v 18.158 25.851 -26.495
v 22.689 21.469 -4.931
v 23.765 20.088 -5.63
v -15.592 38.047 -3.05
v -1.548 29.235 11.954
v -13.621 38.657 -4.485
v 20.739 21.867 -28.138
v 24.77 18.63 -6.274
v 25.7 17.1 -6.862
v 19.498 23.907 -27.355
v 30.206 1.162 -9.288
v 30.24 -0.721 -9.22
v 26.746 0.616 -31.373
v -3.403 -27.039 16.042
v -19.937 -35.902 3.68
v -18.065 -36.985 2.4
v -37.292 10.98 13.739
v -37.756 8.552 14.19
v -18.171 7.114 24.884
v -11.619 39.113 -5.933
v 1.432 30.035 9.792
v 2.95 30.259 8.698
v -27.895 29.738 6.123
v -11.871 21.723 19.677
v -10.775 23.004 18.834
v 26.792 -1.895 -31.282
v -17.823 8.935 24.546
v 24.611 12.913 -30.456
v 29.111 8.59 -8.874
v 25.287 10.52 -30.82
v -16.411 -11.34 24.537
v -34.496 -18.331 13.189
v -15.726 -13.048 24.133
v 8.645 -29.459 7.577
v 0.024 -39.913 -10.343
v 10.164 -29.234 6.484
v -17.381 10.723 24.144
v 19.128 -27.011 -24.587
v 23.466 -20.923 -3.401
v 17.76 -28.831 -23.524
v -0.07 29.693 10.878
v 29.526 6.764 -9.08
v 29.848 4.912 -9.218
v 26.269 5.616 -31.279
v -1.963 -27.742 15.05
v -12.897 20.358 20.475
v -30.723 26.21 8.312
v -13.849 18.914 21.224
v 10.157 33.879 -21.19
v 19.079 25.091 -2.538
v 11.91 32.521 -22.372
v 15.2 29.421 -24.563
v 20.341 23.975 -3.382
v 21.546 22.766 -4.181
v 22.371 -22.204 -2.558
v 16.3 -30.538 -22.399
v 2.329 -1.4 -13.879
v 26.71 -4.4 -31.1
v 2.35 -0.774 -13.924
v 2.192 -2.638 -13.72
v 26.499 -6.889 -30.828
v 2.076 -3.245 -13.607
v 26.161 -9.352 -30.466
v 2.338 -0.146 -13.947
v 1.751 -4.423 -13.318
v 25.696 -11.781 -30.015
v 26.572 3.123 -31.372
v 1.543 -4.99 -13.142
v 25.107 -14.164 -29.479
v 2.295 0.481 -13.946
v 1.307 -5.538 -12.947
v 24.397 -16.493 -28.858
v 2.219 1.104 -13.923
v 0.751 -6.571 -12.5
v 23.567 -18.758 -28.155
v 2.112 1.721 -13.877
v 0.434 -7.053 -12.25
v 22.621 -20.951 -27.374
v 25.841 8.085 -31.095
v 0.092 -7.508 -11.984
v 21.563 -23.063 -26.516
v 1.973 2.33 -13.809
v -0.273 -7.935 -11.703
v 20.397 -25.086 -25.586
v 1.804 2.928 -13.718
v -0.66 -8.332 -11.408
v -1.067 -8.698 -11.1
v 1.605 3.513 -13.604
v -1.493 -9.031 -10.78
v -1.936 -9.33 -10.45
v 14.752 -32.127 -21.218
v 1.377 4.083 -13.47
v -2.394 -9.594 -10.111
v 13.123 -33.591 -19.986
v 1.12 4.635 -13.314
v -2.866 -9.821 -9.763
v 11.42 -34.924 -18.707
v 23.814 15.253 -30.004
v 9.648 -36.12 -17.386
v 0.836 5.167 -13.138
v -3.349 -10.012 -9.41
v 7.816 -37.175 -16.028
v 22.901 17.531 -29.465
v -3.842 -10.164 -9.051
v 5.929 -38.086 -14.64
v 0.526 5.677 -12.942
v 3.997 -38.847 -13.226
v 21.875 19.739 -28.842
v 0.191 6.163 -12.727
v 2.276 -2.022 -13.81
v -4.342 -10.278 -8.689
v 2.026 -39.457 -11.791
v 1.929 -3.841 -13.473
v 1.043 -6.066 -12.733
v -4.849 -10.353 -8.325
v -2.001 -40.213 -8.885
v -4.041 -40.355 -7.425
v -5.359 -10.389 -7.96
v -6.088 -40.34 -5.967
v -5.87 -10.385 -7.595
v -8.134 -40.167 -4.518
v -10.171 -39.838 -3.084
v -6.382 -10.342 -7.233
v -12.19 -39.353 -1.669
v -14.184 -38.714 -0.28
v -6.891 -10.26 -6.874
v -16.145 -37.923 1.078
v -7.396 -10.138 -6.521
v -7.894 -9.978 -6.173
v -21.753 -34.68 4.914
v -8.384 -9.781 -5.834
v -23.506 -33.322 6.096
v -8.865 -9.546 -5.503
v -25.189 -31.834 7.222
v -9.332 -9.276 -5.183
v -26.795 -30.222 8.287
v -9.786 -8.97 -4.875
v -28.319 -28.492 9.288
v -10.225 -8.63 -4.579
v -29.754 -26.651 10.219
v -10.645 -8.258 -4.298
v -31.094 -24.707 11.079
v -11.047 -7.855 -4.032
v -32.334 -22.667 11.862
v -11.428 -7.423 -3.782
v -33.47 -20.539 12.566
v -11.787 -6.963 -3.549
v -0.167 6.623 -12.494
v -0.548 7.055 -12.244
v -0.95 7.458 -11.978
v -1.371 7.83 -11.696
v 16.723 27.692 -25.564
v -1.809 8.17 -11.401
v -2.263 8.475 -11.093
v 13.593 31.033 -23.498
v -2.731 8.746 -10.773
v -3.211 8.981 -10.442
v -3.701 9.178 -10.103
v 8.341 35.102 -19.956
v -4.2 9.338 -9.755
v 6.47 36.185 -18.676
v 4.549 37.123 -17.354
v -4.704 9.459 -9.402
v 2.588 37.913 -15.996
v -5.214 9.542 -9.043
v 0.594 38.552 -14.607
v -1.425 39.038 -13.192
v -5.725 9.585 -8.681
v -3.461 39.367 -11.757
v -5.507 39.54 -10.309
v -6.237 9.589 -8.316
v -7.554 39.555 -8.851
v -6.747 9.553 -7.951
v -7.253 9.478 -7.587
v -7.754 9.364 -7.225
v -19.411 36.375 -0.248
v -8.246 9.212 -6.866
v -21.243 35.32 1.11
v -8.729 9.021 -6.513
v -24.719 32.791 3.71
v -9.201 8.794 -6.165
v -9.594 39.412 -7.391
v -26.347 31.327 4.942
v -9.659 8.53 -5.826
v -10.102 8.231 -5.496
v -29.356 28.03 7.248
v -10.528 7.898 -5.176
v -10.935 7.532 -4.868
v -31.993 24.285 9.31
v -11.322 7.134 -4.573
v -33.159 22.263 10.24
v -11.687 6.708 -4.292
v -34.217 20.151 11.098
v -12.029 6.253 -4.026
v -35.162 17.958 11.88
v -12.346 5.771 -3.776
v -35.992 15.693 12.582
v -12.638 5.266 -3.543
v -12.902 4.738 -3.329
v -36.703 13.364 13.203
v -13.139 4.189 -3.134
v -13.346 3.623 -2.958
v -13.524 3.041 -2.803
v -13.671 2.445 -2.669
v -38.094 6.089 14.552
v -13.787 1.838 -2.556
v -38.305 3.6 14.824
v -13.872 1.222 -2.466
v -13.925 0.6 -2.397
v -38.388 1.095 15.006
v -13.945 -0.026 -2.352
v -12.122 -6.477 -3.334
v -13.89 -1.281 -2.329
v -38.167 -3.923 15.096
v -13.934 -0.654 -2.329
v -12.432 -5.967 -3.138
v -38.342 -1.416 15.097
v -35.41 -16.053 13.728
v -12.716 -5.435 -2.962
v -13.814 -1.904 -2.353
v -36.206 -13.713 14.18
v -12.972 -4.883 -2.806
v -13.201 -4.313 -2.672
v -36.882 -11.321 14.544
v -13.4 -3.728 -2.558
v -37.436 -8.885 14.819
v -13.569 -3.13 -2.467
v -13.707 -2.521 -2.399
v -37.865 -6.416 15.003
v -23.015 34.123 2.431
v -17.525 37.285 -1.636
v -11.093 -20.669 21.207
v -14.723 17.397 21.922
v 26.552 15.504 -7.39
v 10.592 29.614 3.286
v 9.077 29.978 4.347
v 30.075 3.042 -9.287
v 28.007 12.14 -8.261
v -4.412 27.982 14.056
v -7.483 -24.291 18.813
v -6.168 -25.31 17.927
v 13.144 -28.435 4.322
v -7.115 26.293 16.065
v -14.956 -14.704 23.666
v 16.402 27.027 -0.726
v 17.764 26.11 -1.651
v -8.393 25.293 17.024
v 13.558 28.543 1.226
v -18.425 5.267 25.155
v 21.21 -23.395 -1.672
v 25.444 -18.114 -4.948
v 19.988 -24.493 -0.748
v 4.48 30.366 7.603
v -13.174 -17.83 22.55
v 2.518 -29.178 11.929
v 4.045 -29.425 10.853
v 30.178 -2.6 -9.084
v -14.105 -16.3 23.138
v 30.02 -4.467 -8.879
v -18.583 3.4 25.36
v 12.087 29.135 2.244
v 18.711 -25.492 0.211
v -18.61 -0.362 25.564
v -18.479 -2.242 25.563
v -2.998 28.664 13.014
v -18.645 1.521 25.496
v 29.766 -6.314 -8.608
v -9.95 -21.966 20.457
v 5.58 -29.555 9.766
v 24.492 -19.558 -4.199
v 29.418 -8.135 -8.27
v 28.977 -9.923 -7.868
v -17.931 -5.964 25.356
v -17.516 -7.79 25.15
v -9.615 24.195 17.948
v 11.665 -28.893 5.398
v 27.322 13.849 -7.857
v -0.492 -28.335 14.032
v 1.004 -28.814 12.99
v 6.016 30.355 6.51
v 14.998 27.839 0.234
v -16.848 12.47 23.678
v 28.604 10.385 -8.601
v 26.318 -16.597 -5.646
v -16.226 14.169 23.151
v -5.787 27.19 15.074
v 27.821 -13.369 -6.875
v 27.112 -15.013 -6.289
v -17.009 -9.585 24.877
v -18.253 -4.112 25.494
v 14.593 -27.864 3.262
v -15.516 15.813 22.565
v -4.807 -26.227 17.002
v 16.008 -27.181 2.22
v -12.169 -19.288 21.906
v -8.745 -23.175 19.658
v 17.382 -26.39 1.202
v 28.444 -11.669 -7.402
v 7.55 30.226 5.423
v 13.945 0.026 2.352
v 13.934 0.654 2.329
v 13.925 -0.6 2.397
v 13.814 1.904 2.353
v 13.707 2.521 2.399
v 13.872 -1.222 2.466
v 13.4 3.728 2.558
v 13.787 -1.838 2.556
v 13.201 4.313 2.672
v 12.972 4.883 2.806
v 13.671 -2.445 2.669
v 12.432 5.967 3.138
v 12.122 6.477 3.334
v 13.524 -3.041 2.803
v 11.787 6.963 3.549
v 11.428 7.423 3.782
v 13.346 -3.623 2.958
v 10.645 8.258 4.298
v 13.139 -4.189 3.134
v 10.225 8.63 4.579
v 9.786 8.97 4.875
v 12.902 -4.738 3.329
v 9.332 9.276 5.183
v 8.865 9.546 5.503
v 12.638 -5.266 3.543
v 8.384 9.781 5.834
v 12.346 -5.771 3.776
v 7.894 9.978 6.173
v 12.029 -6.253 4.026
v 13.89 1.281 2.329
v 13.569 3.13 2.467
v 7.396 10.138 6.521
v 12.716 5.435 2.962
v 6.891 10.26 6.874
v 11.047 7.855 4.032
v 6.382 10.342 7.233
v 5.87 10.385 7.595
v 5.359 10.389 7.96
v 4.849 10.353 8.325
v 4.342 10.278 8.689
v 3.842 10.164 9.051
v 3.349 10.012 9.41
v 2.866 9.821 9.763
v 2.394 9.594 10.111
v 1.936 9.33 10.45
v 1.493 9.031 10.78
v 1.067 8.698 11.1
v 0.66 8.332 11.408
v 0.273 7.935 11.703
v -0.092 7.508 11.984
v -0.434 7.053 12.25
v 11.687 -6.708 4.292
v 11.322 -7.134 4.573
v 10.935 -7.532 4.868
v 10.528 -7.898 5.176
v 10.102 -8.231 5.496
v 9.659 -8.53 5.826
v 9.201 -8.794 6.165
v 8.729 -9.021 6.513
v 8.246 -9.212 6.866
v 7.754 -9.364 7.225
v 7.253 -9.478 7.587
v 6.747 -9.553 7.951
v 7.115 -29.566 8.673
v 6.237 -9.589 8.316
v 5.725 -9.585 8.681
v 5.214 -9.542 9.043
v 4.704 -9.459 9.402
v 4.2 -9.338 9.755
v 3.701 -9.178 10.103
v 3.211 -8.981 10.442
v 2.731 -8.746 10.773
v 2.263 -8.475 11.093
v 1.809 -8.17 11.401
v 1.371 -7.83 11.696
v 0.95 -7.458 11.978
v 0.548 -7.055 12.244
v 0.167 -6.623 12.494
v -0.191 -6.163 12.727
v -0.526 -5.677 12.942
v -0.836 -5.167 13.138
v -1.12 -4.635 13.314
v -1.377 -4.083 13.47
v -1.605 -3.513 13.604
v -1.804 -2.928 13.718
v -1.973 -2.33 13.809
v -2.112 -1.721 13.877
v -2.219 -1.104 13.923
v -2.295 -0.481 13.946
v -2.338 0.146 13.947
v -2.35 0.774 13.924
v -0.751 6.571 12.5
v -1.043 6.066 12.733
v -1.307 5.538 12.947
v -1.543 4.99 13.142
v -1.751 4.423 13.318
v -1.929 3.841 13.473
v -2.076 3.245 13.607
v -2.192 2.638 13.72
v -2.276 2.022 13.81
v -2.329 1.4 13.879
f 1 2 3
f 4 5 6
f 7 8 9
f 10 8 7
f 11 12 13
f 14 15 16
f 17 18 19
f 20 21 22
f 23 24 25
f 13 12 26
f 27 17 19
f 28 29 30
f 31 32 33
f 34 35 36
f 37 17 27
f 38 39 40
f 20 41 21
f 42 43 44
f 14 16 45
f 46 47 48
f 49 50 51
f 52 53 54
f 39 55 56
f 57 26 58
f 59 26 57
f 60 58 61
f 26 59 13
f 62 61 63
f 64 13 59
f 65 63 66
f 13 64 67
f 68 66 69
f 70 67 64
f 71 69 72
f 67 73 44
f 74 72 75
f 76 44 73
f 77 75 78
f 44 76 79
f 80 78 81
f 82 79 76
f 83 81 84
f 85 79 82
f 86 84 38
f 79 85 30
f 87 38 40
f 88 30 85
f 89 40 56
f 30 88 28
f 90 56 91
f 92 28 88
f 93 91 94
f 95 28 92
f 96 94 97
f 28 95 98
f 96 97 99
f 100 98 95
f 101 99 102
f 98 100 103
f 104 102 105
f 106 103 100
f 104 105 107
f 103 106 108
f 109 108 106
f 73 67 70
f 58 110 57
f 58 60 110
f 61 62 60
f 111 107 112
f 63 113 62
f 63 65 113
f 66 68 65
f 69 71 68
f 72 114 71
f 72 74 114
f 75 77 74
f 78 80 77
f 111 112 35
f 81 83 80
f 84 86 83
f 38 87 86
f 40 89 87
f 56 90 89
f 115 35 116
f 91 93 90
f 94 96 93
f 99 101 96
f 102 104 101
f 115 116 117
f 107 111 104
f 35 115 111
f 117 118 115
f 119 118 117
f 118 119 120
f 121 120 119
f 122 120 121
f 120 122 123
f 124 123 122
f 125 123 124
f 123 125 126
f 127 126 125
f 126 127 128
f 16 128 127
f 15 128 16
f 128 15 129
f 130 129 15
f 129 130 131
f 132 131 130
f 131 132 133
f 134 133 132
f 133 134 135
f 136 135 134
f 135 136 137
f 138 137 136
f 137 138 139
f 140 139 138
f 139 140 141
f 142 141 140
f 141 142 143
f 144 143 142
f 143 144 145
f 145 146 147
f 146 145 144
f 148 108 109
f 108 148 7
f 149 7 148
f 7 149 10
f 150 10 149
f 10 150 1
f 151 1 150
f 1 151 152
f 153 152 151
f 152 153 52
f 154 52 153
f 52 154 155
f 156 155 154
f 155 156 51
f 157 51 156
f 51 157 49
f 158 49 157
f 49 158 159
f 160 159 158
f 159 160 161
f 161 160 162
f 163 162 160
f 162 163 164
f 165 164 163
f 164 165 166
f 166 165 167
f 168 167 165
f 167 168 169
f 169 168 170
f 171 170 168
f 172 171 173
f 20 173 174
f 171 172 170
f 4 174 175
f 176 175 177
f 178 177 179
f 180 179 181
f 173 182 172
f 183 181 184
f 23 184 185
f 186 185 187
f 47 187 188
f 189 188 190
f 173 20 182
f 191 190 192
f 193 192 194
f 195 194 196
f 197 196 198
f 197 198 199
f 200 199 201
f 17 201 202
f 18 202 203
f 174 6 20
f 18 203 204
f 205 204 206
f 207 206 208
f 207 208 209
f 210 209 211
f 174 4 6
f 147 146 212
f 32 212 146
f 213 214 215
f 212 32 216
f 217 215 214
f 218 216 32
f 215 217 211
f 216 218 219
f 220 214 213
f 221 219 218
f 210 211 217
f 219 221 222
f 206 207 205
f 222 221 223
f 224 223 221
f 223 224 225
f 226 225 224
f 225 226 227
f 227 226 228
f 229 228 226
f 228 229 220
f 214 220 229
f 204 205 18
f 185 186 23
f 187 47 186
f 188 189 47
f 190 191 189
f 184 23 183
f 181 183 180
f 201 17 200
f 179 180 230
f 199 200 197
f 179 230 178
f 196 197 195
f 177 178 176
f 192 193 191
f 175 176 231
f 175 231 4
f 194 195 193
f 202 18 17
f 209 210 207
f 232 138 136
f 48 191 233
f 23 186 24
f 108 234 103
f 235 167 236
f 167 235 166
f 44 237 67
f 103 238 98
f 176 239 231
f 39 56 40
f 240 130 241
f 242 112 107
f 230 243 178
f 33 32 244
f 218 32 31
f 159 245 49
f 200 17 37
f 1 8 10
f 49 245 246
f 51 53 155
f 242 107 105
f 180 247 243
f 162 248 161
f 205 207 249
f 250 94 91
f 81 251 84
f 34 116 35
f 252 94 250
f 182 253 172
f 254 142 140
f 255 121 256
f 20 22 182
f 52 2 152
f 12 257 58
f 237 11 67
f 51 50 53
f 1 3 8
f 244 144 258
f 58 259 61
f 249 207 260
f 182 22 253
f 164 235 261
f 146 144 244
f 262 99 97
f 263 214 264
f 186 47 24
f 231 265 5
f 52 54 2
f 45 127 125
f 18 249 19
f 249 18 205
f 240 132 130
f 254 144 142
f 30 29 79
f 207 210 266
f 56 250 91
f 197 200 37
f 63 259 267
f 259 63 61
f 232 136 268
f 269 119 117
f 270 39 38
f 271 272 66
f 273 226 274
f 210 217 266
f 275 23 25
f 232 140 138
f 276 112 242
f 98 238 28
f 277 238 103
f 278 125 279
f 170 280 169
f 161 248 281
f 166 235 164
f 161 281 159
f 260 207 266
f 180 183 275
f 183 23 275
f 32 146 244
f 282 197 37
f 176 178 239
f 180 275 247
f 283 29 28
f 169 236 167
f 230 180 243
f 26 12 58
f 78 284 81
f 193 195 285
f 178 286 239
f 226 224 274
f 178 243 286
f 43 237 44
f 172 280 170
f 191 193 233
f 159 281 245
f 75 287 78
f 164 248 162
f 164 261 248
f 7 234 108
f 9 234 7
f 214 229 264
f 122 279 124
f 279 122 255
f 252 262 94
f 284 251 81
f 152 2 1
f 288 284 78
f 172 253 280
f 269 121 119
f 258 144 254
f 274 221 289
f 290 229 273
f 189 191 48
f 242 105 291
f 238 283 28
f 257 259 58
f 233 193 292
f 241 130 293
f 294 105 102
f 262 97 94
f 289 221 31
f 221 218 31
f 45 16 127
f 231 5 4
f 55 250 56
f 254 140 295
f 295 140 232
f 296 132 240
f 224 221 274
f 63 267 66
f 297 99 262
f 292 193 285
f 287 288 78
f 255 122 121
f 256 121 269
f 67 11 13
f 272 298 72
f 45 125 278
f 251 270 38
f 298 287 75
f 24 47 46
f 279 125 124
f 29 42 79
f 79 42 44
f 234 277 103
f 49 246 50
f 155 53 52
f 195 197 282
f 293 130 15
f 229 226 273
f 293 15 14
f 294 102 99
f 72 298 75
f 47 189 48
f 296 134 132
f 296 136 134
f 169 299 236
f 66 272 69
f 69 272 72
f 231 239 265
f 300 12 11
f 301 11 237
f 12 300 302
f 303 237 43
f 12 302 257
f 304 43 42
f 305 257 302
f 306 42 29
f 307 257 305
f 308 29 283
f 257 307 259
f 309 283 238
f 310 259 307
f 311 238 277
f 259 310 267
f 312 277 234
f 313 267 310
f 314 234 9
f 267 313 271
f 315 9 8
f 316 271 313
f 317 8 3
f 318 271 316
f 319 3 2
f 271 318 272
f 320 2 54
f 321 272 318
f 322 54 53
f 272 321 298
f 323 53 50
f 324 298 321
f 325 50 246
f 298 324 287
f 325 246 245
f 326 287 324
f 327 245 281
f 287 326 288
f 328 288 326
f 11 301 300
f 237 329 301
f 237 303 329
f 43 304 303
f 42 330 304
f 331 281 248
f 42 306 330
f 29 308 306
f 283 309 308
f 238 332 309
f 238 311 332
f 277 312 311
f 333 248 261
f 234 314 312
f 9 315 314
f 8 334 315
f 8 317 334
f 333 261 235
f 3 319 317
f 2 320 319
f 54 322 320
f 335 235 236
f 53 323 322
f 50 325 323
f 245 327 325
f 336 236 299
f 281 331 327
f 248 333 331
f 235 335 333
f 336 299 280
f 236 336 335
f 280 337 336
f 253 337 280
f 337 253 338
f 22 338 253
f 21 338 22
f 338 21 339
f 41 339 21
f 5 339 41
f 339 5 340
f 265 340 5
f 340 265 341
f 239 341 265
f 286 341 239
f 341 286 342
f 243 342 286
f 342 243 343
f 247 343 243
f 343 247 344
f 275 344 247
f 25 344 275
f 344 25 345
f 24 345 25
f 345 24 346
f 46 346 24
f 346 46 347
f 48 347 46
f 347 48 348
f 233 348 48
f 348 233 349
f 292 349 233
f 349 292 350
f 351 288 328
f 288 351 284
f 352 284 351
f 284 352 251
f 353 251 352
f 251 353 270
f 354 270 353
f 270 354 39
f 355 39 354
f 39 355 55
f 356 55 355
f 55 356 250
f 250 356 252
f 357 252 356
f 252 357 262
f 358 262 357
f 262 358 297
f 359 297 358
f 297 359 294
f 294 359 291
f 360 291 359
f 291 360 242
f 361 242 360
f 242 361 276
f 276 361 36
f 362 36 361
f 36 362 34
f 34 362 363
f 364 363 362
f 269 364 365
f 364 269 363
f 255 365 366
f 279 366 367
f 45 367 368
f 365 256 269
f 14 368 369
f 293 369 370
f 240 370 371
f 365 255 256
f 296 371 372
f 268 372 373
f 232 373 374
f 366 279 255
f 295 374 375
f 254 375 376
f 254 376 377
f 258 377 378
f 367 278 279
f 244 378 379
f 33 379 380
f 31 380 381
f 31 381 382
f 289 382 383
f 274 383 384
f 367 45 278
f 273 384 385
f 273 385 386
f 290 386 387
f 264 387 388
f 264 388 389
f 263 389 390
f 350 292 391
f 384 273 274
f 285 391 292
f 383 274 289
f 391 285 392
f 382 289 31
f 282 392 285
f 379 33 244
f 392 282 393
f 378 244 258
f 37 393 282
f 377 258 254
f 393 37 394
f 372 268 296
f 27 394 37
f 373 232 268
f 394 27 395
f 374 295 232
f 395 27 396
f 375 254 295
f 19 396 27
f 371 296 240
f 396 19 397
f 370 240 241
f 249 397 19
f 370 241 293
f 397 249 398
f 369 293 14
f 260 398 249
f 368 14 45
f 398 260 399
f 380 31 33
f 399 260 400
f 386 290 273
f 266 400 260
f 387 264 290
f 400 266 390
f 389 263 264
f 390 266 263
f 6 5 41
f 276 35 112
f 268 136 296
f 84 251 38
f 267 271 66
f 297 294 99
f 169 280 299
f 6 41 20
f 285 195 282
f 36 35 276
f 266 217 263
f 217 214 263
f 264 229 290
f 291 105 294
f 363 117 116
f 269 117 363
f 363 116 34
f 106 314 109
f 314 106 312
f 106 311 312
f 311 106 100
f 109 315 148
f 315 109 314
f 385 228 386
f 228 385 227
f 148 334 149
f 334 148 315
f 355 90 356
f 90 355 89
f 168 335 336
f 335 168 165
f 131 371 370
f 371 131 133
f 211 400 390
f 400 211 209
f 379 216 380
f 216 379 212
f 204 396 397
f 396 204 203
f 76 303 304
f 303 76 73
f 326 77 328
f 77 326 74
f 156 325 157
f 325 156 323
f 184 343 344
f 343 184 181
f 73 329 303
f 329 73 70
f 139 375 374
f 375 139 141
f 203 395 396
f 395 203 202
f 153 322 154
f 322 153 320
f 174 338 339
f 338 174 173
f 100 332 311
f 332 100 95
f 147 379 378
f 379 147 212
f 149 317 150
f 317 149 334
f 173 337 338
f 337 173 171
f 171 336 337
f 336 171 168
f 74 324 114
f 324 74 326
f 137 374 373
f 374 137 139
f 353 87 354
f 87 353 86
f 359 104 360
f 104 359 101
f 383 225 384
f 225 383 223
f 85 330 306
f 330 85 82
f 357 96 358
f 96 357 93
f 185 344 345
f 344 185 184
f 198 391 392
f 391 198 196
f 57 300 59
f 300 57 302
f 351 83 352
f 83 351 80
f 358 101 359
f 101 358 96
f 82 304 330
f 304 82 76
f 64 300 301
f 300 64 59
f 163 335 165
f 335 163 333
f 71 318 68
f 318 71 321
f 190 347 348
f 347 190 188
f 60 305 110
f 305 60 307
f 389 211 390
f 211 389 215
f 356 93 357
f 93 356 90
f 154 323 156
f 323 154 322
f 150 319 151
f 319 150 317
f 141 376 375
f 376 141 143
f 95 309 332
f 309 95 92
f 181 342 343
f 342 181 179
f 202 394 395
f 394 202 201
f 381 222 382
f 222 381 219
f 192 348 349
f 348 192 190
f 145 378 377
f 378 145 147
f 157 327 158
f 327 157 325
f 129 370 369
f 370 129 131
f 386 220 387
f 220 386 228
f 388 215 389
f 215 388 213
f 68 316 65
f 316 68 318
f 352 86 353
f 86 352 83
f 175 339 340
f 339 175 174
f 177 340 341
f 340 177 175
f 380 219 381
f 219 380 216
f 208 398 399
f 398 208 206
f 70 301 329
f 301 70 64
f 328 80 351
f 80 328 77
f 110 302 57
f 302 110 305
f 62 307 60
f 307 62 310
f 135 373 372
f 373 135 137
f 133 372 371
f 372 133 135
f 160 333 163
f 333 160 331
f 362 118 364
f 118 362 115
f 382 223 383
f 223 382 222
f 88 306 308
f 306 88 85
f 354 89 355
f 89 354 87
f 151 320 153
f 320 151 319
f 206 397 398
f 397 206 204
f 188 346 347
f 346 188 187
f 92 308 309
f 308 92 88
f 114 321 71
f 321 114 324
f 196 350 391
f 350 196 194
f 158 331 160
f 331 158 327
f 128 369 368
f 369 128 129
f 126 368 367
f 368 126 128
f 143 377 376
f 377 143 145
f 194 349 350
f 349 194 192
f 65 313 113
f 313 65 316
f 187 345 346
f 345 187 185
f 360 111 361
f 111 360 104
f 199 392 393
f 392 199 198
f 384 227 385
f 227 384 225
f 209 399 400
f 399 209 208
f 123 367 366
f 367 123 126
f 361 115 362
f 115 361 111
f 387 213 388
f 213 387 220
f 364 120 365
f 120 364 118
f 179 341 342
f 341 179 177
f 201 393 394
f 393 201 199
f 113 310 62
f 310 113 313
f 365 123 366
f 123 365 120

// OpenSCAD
union(){
  rotate(a=[20,30,40]){
    difference(){
      cylinder(h=20,r1=40,r2=30,center=true,$fa=12,$fs=2,$fn=100);
      cylinder(h=200,r1=10,r2=10,center=true,$fa=12,$fs=2,$fn=100);
    }
  }
}
